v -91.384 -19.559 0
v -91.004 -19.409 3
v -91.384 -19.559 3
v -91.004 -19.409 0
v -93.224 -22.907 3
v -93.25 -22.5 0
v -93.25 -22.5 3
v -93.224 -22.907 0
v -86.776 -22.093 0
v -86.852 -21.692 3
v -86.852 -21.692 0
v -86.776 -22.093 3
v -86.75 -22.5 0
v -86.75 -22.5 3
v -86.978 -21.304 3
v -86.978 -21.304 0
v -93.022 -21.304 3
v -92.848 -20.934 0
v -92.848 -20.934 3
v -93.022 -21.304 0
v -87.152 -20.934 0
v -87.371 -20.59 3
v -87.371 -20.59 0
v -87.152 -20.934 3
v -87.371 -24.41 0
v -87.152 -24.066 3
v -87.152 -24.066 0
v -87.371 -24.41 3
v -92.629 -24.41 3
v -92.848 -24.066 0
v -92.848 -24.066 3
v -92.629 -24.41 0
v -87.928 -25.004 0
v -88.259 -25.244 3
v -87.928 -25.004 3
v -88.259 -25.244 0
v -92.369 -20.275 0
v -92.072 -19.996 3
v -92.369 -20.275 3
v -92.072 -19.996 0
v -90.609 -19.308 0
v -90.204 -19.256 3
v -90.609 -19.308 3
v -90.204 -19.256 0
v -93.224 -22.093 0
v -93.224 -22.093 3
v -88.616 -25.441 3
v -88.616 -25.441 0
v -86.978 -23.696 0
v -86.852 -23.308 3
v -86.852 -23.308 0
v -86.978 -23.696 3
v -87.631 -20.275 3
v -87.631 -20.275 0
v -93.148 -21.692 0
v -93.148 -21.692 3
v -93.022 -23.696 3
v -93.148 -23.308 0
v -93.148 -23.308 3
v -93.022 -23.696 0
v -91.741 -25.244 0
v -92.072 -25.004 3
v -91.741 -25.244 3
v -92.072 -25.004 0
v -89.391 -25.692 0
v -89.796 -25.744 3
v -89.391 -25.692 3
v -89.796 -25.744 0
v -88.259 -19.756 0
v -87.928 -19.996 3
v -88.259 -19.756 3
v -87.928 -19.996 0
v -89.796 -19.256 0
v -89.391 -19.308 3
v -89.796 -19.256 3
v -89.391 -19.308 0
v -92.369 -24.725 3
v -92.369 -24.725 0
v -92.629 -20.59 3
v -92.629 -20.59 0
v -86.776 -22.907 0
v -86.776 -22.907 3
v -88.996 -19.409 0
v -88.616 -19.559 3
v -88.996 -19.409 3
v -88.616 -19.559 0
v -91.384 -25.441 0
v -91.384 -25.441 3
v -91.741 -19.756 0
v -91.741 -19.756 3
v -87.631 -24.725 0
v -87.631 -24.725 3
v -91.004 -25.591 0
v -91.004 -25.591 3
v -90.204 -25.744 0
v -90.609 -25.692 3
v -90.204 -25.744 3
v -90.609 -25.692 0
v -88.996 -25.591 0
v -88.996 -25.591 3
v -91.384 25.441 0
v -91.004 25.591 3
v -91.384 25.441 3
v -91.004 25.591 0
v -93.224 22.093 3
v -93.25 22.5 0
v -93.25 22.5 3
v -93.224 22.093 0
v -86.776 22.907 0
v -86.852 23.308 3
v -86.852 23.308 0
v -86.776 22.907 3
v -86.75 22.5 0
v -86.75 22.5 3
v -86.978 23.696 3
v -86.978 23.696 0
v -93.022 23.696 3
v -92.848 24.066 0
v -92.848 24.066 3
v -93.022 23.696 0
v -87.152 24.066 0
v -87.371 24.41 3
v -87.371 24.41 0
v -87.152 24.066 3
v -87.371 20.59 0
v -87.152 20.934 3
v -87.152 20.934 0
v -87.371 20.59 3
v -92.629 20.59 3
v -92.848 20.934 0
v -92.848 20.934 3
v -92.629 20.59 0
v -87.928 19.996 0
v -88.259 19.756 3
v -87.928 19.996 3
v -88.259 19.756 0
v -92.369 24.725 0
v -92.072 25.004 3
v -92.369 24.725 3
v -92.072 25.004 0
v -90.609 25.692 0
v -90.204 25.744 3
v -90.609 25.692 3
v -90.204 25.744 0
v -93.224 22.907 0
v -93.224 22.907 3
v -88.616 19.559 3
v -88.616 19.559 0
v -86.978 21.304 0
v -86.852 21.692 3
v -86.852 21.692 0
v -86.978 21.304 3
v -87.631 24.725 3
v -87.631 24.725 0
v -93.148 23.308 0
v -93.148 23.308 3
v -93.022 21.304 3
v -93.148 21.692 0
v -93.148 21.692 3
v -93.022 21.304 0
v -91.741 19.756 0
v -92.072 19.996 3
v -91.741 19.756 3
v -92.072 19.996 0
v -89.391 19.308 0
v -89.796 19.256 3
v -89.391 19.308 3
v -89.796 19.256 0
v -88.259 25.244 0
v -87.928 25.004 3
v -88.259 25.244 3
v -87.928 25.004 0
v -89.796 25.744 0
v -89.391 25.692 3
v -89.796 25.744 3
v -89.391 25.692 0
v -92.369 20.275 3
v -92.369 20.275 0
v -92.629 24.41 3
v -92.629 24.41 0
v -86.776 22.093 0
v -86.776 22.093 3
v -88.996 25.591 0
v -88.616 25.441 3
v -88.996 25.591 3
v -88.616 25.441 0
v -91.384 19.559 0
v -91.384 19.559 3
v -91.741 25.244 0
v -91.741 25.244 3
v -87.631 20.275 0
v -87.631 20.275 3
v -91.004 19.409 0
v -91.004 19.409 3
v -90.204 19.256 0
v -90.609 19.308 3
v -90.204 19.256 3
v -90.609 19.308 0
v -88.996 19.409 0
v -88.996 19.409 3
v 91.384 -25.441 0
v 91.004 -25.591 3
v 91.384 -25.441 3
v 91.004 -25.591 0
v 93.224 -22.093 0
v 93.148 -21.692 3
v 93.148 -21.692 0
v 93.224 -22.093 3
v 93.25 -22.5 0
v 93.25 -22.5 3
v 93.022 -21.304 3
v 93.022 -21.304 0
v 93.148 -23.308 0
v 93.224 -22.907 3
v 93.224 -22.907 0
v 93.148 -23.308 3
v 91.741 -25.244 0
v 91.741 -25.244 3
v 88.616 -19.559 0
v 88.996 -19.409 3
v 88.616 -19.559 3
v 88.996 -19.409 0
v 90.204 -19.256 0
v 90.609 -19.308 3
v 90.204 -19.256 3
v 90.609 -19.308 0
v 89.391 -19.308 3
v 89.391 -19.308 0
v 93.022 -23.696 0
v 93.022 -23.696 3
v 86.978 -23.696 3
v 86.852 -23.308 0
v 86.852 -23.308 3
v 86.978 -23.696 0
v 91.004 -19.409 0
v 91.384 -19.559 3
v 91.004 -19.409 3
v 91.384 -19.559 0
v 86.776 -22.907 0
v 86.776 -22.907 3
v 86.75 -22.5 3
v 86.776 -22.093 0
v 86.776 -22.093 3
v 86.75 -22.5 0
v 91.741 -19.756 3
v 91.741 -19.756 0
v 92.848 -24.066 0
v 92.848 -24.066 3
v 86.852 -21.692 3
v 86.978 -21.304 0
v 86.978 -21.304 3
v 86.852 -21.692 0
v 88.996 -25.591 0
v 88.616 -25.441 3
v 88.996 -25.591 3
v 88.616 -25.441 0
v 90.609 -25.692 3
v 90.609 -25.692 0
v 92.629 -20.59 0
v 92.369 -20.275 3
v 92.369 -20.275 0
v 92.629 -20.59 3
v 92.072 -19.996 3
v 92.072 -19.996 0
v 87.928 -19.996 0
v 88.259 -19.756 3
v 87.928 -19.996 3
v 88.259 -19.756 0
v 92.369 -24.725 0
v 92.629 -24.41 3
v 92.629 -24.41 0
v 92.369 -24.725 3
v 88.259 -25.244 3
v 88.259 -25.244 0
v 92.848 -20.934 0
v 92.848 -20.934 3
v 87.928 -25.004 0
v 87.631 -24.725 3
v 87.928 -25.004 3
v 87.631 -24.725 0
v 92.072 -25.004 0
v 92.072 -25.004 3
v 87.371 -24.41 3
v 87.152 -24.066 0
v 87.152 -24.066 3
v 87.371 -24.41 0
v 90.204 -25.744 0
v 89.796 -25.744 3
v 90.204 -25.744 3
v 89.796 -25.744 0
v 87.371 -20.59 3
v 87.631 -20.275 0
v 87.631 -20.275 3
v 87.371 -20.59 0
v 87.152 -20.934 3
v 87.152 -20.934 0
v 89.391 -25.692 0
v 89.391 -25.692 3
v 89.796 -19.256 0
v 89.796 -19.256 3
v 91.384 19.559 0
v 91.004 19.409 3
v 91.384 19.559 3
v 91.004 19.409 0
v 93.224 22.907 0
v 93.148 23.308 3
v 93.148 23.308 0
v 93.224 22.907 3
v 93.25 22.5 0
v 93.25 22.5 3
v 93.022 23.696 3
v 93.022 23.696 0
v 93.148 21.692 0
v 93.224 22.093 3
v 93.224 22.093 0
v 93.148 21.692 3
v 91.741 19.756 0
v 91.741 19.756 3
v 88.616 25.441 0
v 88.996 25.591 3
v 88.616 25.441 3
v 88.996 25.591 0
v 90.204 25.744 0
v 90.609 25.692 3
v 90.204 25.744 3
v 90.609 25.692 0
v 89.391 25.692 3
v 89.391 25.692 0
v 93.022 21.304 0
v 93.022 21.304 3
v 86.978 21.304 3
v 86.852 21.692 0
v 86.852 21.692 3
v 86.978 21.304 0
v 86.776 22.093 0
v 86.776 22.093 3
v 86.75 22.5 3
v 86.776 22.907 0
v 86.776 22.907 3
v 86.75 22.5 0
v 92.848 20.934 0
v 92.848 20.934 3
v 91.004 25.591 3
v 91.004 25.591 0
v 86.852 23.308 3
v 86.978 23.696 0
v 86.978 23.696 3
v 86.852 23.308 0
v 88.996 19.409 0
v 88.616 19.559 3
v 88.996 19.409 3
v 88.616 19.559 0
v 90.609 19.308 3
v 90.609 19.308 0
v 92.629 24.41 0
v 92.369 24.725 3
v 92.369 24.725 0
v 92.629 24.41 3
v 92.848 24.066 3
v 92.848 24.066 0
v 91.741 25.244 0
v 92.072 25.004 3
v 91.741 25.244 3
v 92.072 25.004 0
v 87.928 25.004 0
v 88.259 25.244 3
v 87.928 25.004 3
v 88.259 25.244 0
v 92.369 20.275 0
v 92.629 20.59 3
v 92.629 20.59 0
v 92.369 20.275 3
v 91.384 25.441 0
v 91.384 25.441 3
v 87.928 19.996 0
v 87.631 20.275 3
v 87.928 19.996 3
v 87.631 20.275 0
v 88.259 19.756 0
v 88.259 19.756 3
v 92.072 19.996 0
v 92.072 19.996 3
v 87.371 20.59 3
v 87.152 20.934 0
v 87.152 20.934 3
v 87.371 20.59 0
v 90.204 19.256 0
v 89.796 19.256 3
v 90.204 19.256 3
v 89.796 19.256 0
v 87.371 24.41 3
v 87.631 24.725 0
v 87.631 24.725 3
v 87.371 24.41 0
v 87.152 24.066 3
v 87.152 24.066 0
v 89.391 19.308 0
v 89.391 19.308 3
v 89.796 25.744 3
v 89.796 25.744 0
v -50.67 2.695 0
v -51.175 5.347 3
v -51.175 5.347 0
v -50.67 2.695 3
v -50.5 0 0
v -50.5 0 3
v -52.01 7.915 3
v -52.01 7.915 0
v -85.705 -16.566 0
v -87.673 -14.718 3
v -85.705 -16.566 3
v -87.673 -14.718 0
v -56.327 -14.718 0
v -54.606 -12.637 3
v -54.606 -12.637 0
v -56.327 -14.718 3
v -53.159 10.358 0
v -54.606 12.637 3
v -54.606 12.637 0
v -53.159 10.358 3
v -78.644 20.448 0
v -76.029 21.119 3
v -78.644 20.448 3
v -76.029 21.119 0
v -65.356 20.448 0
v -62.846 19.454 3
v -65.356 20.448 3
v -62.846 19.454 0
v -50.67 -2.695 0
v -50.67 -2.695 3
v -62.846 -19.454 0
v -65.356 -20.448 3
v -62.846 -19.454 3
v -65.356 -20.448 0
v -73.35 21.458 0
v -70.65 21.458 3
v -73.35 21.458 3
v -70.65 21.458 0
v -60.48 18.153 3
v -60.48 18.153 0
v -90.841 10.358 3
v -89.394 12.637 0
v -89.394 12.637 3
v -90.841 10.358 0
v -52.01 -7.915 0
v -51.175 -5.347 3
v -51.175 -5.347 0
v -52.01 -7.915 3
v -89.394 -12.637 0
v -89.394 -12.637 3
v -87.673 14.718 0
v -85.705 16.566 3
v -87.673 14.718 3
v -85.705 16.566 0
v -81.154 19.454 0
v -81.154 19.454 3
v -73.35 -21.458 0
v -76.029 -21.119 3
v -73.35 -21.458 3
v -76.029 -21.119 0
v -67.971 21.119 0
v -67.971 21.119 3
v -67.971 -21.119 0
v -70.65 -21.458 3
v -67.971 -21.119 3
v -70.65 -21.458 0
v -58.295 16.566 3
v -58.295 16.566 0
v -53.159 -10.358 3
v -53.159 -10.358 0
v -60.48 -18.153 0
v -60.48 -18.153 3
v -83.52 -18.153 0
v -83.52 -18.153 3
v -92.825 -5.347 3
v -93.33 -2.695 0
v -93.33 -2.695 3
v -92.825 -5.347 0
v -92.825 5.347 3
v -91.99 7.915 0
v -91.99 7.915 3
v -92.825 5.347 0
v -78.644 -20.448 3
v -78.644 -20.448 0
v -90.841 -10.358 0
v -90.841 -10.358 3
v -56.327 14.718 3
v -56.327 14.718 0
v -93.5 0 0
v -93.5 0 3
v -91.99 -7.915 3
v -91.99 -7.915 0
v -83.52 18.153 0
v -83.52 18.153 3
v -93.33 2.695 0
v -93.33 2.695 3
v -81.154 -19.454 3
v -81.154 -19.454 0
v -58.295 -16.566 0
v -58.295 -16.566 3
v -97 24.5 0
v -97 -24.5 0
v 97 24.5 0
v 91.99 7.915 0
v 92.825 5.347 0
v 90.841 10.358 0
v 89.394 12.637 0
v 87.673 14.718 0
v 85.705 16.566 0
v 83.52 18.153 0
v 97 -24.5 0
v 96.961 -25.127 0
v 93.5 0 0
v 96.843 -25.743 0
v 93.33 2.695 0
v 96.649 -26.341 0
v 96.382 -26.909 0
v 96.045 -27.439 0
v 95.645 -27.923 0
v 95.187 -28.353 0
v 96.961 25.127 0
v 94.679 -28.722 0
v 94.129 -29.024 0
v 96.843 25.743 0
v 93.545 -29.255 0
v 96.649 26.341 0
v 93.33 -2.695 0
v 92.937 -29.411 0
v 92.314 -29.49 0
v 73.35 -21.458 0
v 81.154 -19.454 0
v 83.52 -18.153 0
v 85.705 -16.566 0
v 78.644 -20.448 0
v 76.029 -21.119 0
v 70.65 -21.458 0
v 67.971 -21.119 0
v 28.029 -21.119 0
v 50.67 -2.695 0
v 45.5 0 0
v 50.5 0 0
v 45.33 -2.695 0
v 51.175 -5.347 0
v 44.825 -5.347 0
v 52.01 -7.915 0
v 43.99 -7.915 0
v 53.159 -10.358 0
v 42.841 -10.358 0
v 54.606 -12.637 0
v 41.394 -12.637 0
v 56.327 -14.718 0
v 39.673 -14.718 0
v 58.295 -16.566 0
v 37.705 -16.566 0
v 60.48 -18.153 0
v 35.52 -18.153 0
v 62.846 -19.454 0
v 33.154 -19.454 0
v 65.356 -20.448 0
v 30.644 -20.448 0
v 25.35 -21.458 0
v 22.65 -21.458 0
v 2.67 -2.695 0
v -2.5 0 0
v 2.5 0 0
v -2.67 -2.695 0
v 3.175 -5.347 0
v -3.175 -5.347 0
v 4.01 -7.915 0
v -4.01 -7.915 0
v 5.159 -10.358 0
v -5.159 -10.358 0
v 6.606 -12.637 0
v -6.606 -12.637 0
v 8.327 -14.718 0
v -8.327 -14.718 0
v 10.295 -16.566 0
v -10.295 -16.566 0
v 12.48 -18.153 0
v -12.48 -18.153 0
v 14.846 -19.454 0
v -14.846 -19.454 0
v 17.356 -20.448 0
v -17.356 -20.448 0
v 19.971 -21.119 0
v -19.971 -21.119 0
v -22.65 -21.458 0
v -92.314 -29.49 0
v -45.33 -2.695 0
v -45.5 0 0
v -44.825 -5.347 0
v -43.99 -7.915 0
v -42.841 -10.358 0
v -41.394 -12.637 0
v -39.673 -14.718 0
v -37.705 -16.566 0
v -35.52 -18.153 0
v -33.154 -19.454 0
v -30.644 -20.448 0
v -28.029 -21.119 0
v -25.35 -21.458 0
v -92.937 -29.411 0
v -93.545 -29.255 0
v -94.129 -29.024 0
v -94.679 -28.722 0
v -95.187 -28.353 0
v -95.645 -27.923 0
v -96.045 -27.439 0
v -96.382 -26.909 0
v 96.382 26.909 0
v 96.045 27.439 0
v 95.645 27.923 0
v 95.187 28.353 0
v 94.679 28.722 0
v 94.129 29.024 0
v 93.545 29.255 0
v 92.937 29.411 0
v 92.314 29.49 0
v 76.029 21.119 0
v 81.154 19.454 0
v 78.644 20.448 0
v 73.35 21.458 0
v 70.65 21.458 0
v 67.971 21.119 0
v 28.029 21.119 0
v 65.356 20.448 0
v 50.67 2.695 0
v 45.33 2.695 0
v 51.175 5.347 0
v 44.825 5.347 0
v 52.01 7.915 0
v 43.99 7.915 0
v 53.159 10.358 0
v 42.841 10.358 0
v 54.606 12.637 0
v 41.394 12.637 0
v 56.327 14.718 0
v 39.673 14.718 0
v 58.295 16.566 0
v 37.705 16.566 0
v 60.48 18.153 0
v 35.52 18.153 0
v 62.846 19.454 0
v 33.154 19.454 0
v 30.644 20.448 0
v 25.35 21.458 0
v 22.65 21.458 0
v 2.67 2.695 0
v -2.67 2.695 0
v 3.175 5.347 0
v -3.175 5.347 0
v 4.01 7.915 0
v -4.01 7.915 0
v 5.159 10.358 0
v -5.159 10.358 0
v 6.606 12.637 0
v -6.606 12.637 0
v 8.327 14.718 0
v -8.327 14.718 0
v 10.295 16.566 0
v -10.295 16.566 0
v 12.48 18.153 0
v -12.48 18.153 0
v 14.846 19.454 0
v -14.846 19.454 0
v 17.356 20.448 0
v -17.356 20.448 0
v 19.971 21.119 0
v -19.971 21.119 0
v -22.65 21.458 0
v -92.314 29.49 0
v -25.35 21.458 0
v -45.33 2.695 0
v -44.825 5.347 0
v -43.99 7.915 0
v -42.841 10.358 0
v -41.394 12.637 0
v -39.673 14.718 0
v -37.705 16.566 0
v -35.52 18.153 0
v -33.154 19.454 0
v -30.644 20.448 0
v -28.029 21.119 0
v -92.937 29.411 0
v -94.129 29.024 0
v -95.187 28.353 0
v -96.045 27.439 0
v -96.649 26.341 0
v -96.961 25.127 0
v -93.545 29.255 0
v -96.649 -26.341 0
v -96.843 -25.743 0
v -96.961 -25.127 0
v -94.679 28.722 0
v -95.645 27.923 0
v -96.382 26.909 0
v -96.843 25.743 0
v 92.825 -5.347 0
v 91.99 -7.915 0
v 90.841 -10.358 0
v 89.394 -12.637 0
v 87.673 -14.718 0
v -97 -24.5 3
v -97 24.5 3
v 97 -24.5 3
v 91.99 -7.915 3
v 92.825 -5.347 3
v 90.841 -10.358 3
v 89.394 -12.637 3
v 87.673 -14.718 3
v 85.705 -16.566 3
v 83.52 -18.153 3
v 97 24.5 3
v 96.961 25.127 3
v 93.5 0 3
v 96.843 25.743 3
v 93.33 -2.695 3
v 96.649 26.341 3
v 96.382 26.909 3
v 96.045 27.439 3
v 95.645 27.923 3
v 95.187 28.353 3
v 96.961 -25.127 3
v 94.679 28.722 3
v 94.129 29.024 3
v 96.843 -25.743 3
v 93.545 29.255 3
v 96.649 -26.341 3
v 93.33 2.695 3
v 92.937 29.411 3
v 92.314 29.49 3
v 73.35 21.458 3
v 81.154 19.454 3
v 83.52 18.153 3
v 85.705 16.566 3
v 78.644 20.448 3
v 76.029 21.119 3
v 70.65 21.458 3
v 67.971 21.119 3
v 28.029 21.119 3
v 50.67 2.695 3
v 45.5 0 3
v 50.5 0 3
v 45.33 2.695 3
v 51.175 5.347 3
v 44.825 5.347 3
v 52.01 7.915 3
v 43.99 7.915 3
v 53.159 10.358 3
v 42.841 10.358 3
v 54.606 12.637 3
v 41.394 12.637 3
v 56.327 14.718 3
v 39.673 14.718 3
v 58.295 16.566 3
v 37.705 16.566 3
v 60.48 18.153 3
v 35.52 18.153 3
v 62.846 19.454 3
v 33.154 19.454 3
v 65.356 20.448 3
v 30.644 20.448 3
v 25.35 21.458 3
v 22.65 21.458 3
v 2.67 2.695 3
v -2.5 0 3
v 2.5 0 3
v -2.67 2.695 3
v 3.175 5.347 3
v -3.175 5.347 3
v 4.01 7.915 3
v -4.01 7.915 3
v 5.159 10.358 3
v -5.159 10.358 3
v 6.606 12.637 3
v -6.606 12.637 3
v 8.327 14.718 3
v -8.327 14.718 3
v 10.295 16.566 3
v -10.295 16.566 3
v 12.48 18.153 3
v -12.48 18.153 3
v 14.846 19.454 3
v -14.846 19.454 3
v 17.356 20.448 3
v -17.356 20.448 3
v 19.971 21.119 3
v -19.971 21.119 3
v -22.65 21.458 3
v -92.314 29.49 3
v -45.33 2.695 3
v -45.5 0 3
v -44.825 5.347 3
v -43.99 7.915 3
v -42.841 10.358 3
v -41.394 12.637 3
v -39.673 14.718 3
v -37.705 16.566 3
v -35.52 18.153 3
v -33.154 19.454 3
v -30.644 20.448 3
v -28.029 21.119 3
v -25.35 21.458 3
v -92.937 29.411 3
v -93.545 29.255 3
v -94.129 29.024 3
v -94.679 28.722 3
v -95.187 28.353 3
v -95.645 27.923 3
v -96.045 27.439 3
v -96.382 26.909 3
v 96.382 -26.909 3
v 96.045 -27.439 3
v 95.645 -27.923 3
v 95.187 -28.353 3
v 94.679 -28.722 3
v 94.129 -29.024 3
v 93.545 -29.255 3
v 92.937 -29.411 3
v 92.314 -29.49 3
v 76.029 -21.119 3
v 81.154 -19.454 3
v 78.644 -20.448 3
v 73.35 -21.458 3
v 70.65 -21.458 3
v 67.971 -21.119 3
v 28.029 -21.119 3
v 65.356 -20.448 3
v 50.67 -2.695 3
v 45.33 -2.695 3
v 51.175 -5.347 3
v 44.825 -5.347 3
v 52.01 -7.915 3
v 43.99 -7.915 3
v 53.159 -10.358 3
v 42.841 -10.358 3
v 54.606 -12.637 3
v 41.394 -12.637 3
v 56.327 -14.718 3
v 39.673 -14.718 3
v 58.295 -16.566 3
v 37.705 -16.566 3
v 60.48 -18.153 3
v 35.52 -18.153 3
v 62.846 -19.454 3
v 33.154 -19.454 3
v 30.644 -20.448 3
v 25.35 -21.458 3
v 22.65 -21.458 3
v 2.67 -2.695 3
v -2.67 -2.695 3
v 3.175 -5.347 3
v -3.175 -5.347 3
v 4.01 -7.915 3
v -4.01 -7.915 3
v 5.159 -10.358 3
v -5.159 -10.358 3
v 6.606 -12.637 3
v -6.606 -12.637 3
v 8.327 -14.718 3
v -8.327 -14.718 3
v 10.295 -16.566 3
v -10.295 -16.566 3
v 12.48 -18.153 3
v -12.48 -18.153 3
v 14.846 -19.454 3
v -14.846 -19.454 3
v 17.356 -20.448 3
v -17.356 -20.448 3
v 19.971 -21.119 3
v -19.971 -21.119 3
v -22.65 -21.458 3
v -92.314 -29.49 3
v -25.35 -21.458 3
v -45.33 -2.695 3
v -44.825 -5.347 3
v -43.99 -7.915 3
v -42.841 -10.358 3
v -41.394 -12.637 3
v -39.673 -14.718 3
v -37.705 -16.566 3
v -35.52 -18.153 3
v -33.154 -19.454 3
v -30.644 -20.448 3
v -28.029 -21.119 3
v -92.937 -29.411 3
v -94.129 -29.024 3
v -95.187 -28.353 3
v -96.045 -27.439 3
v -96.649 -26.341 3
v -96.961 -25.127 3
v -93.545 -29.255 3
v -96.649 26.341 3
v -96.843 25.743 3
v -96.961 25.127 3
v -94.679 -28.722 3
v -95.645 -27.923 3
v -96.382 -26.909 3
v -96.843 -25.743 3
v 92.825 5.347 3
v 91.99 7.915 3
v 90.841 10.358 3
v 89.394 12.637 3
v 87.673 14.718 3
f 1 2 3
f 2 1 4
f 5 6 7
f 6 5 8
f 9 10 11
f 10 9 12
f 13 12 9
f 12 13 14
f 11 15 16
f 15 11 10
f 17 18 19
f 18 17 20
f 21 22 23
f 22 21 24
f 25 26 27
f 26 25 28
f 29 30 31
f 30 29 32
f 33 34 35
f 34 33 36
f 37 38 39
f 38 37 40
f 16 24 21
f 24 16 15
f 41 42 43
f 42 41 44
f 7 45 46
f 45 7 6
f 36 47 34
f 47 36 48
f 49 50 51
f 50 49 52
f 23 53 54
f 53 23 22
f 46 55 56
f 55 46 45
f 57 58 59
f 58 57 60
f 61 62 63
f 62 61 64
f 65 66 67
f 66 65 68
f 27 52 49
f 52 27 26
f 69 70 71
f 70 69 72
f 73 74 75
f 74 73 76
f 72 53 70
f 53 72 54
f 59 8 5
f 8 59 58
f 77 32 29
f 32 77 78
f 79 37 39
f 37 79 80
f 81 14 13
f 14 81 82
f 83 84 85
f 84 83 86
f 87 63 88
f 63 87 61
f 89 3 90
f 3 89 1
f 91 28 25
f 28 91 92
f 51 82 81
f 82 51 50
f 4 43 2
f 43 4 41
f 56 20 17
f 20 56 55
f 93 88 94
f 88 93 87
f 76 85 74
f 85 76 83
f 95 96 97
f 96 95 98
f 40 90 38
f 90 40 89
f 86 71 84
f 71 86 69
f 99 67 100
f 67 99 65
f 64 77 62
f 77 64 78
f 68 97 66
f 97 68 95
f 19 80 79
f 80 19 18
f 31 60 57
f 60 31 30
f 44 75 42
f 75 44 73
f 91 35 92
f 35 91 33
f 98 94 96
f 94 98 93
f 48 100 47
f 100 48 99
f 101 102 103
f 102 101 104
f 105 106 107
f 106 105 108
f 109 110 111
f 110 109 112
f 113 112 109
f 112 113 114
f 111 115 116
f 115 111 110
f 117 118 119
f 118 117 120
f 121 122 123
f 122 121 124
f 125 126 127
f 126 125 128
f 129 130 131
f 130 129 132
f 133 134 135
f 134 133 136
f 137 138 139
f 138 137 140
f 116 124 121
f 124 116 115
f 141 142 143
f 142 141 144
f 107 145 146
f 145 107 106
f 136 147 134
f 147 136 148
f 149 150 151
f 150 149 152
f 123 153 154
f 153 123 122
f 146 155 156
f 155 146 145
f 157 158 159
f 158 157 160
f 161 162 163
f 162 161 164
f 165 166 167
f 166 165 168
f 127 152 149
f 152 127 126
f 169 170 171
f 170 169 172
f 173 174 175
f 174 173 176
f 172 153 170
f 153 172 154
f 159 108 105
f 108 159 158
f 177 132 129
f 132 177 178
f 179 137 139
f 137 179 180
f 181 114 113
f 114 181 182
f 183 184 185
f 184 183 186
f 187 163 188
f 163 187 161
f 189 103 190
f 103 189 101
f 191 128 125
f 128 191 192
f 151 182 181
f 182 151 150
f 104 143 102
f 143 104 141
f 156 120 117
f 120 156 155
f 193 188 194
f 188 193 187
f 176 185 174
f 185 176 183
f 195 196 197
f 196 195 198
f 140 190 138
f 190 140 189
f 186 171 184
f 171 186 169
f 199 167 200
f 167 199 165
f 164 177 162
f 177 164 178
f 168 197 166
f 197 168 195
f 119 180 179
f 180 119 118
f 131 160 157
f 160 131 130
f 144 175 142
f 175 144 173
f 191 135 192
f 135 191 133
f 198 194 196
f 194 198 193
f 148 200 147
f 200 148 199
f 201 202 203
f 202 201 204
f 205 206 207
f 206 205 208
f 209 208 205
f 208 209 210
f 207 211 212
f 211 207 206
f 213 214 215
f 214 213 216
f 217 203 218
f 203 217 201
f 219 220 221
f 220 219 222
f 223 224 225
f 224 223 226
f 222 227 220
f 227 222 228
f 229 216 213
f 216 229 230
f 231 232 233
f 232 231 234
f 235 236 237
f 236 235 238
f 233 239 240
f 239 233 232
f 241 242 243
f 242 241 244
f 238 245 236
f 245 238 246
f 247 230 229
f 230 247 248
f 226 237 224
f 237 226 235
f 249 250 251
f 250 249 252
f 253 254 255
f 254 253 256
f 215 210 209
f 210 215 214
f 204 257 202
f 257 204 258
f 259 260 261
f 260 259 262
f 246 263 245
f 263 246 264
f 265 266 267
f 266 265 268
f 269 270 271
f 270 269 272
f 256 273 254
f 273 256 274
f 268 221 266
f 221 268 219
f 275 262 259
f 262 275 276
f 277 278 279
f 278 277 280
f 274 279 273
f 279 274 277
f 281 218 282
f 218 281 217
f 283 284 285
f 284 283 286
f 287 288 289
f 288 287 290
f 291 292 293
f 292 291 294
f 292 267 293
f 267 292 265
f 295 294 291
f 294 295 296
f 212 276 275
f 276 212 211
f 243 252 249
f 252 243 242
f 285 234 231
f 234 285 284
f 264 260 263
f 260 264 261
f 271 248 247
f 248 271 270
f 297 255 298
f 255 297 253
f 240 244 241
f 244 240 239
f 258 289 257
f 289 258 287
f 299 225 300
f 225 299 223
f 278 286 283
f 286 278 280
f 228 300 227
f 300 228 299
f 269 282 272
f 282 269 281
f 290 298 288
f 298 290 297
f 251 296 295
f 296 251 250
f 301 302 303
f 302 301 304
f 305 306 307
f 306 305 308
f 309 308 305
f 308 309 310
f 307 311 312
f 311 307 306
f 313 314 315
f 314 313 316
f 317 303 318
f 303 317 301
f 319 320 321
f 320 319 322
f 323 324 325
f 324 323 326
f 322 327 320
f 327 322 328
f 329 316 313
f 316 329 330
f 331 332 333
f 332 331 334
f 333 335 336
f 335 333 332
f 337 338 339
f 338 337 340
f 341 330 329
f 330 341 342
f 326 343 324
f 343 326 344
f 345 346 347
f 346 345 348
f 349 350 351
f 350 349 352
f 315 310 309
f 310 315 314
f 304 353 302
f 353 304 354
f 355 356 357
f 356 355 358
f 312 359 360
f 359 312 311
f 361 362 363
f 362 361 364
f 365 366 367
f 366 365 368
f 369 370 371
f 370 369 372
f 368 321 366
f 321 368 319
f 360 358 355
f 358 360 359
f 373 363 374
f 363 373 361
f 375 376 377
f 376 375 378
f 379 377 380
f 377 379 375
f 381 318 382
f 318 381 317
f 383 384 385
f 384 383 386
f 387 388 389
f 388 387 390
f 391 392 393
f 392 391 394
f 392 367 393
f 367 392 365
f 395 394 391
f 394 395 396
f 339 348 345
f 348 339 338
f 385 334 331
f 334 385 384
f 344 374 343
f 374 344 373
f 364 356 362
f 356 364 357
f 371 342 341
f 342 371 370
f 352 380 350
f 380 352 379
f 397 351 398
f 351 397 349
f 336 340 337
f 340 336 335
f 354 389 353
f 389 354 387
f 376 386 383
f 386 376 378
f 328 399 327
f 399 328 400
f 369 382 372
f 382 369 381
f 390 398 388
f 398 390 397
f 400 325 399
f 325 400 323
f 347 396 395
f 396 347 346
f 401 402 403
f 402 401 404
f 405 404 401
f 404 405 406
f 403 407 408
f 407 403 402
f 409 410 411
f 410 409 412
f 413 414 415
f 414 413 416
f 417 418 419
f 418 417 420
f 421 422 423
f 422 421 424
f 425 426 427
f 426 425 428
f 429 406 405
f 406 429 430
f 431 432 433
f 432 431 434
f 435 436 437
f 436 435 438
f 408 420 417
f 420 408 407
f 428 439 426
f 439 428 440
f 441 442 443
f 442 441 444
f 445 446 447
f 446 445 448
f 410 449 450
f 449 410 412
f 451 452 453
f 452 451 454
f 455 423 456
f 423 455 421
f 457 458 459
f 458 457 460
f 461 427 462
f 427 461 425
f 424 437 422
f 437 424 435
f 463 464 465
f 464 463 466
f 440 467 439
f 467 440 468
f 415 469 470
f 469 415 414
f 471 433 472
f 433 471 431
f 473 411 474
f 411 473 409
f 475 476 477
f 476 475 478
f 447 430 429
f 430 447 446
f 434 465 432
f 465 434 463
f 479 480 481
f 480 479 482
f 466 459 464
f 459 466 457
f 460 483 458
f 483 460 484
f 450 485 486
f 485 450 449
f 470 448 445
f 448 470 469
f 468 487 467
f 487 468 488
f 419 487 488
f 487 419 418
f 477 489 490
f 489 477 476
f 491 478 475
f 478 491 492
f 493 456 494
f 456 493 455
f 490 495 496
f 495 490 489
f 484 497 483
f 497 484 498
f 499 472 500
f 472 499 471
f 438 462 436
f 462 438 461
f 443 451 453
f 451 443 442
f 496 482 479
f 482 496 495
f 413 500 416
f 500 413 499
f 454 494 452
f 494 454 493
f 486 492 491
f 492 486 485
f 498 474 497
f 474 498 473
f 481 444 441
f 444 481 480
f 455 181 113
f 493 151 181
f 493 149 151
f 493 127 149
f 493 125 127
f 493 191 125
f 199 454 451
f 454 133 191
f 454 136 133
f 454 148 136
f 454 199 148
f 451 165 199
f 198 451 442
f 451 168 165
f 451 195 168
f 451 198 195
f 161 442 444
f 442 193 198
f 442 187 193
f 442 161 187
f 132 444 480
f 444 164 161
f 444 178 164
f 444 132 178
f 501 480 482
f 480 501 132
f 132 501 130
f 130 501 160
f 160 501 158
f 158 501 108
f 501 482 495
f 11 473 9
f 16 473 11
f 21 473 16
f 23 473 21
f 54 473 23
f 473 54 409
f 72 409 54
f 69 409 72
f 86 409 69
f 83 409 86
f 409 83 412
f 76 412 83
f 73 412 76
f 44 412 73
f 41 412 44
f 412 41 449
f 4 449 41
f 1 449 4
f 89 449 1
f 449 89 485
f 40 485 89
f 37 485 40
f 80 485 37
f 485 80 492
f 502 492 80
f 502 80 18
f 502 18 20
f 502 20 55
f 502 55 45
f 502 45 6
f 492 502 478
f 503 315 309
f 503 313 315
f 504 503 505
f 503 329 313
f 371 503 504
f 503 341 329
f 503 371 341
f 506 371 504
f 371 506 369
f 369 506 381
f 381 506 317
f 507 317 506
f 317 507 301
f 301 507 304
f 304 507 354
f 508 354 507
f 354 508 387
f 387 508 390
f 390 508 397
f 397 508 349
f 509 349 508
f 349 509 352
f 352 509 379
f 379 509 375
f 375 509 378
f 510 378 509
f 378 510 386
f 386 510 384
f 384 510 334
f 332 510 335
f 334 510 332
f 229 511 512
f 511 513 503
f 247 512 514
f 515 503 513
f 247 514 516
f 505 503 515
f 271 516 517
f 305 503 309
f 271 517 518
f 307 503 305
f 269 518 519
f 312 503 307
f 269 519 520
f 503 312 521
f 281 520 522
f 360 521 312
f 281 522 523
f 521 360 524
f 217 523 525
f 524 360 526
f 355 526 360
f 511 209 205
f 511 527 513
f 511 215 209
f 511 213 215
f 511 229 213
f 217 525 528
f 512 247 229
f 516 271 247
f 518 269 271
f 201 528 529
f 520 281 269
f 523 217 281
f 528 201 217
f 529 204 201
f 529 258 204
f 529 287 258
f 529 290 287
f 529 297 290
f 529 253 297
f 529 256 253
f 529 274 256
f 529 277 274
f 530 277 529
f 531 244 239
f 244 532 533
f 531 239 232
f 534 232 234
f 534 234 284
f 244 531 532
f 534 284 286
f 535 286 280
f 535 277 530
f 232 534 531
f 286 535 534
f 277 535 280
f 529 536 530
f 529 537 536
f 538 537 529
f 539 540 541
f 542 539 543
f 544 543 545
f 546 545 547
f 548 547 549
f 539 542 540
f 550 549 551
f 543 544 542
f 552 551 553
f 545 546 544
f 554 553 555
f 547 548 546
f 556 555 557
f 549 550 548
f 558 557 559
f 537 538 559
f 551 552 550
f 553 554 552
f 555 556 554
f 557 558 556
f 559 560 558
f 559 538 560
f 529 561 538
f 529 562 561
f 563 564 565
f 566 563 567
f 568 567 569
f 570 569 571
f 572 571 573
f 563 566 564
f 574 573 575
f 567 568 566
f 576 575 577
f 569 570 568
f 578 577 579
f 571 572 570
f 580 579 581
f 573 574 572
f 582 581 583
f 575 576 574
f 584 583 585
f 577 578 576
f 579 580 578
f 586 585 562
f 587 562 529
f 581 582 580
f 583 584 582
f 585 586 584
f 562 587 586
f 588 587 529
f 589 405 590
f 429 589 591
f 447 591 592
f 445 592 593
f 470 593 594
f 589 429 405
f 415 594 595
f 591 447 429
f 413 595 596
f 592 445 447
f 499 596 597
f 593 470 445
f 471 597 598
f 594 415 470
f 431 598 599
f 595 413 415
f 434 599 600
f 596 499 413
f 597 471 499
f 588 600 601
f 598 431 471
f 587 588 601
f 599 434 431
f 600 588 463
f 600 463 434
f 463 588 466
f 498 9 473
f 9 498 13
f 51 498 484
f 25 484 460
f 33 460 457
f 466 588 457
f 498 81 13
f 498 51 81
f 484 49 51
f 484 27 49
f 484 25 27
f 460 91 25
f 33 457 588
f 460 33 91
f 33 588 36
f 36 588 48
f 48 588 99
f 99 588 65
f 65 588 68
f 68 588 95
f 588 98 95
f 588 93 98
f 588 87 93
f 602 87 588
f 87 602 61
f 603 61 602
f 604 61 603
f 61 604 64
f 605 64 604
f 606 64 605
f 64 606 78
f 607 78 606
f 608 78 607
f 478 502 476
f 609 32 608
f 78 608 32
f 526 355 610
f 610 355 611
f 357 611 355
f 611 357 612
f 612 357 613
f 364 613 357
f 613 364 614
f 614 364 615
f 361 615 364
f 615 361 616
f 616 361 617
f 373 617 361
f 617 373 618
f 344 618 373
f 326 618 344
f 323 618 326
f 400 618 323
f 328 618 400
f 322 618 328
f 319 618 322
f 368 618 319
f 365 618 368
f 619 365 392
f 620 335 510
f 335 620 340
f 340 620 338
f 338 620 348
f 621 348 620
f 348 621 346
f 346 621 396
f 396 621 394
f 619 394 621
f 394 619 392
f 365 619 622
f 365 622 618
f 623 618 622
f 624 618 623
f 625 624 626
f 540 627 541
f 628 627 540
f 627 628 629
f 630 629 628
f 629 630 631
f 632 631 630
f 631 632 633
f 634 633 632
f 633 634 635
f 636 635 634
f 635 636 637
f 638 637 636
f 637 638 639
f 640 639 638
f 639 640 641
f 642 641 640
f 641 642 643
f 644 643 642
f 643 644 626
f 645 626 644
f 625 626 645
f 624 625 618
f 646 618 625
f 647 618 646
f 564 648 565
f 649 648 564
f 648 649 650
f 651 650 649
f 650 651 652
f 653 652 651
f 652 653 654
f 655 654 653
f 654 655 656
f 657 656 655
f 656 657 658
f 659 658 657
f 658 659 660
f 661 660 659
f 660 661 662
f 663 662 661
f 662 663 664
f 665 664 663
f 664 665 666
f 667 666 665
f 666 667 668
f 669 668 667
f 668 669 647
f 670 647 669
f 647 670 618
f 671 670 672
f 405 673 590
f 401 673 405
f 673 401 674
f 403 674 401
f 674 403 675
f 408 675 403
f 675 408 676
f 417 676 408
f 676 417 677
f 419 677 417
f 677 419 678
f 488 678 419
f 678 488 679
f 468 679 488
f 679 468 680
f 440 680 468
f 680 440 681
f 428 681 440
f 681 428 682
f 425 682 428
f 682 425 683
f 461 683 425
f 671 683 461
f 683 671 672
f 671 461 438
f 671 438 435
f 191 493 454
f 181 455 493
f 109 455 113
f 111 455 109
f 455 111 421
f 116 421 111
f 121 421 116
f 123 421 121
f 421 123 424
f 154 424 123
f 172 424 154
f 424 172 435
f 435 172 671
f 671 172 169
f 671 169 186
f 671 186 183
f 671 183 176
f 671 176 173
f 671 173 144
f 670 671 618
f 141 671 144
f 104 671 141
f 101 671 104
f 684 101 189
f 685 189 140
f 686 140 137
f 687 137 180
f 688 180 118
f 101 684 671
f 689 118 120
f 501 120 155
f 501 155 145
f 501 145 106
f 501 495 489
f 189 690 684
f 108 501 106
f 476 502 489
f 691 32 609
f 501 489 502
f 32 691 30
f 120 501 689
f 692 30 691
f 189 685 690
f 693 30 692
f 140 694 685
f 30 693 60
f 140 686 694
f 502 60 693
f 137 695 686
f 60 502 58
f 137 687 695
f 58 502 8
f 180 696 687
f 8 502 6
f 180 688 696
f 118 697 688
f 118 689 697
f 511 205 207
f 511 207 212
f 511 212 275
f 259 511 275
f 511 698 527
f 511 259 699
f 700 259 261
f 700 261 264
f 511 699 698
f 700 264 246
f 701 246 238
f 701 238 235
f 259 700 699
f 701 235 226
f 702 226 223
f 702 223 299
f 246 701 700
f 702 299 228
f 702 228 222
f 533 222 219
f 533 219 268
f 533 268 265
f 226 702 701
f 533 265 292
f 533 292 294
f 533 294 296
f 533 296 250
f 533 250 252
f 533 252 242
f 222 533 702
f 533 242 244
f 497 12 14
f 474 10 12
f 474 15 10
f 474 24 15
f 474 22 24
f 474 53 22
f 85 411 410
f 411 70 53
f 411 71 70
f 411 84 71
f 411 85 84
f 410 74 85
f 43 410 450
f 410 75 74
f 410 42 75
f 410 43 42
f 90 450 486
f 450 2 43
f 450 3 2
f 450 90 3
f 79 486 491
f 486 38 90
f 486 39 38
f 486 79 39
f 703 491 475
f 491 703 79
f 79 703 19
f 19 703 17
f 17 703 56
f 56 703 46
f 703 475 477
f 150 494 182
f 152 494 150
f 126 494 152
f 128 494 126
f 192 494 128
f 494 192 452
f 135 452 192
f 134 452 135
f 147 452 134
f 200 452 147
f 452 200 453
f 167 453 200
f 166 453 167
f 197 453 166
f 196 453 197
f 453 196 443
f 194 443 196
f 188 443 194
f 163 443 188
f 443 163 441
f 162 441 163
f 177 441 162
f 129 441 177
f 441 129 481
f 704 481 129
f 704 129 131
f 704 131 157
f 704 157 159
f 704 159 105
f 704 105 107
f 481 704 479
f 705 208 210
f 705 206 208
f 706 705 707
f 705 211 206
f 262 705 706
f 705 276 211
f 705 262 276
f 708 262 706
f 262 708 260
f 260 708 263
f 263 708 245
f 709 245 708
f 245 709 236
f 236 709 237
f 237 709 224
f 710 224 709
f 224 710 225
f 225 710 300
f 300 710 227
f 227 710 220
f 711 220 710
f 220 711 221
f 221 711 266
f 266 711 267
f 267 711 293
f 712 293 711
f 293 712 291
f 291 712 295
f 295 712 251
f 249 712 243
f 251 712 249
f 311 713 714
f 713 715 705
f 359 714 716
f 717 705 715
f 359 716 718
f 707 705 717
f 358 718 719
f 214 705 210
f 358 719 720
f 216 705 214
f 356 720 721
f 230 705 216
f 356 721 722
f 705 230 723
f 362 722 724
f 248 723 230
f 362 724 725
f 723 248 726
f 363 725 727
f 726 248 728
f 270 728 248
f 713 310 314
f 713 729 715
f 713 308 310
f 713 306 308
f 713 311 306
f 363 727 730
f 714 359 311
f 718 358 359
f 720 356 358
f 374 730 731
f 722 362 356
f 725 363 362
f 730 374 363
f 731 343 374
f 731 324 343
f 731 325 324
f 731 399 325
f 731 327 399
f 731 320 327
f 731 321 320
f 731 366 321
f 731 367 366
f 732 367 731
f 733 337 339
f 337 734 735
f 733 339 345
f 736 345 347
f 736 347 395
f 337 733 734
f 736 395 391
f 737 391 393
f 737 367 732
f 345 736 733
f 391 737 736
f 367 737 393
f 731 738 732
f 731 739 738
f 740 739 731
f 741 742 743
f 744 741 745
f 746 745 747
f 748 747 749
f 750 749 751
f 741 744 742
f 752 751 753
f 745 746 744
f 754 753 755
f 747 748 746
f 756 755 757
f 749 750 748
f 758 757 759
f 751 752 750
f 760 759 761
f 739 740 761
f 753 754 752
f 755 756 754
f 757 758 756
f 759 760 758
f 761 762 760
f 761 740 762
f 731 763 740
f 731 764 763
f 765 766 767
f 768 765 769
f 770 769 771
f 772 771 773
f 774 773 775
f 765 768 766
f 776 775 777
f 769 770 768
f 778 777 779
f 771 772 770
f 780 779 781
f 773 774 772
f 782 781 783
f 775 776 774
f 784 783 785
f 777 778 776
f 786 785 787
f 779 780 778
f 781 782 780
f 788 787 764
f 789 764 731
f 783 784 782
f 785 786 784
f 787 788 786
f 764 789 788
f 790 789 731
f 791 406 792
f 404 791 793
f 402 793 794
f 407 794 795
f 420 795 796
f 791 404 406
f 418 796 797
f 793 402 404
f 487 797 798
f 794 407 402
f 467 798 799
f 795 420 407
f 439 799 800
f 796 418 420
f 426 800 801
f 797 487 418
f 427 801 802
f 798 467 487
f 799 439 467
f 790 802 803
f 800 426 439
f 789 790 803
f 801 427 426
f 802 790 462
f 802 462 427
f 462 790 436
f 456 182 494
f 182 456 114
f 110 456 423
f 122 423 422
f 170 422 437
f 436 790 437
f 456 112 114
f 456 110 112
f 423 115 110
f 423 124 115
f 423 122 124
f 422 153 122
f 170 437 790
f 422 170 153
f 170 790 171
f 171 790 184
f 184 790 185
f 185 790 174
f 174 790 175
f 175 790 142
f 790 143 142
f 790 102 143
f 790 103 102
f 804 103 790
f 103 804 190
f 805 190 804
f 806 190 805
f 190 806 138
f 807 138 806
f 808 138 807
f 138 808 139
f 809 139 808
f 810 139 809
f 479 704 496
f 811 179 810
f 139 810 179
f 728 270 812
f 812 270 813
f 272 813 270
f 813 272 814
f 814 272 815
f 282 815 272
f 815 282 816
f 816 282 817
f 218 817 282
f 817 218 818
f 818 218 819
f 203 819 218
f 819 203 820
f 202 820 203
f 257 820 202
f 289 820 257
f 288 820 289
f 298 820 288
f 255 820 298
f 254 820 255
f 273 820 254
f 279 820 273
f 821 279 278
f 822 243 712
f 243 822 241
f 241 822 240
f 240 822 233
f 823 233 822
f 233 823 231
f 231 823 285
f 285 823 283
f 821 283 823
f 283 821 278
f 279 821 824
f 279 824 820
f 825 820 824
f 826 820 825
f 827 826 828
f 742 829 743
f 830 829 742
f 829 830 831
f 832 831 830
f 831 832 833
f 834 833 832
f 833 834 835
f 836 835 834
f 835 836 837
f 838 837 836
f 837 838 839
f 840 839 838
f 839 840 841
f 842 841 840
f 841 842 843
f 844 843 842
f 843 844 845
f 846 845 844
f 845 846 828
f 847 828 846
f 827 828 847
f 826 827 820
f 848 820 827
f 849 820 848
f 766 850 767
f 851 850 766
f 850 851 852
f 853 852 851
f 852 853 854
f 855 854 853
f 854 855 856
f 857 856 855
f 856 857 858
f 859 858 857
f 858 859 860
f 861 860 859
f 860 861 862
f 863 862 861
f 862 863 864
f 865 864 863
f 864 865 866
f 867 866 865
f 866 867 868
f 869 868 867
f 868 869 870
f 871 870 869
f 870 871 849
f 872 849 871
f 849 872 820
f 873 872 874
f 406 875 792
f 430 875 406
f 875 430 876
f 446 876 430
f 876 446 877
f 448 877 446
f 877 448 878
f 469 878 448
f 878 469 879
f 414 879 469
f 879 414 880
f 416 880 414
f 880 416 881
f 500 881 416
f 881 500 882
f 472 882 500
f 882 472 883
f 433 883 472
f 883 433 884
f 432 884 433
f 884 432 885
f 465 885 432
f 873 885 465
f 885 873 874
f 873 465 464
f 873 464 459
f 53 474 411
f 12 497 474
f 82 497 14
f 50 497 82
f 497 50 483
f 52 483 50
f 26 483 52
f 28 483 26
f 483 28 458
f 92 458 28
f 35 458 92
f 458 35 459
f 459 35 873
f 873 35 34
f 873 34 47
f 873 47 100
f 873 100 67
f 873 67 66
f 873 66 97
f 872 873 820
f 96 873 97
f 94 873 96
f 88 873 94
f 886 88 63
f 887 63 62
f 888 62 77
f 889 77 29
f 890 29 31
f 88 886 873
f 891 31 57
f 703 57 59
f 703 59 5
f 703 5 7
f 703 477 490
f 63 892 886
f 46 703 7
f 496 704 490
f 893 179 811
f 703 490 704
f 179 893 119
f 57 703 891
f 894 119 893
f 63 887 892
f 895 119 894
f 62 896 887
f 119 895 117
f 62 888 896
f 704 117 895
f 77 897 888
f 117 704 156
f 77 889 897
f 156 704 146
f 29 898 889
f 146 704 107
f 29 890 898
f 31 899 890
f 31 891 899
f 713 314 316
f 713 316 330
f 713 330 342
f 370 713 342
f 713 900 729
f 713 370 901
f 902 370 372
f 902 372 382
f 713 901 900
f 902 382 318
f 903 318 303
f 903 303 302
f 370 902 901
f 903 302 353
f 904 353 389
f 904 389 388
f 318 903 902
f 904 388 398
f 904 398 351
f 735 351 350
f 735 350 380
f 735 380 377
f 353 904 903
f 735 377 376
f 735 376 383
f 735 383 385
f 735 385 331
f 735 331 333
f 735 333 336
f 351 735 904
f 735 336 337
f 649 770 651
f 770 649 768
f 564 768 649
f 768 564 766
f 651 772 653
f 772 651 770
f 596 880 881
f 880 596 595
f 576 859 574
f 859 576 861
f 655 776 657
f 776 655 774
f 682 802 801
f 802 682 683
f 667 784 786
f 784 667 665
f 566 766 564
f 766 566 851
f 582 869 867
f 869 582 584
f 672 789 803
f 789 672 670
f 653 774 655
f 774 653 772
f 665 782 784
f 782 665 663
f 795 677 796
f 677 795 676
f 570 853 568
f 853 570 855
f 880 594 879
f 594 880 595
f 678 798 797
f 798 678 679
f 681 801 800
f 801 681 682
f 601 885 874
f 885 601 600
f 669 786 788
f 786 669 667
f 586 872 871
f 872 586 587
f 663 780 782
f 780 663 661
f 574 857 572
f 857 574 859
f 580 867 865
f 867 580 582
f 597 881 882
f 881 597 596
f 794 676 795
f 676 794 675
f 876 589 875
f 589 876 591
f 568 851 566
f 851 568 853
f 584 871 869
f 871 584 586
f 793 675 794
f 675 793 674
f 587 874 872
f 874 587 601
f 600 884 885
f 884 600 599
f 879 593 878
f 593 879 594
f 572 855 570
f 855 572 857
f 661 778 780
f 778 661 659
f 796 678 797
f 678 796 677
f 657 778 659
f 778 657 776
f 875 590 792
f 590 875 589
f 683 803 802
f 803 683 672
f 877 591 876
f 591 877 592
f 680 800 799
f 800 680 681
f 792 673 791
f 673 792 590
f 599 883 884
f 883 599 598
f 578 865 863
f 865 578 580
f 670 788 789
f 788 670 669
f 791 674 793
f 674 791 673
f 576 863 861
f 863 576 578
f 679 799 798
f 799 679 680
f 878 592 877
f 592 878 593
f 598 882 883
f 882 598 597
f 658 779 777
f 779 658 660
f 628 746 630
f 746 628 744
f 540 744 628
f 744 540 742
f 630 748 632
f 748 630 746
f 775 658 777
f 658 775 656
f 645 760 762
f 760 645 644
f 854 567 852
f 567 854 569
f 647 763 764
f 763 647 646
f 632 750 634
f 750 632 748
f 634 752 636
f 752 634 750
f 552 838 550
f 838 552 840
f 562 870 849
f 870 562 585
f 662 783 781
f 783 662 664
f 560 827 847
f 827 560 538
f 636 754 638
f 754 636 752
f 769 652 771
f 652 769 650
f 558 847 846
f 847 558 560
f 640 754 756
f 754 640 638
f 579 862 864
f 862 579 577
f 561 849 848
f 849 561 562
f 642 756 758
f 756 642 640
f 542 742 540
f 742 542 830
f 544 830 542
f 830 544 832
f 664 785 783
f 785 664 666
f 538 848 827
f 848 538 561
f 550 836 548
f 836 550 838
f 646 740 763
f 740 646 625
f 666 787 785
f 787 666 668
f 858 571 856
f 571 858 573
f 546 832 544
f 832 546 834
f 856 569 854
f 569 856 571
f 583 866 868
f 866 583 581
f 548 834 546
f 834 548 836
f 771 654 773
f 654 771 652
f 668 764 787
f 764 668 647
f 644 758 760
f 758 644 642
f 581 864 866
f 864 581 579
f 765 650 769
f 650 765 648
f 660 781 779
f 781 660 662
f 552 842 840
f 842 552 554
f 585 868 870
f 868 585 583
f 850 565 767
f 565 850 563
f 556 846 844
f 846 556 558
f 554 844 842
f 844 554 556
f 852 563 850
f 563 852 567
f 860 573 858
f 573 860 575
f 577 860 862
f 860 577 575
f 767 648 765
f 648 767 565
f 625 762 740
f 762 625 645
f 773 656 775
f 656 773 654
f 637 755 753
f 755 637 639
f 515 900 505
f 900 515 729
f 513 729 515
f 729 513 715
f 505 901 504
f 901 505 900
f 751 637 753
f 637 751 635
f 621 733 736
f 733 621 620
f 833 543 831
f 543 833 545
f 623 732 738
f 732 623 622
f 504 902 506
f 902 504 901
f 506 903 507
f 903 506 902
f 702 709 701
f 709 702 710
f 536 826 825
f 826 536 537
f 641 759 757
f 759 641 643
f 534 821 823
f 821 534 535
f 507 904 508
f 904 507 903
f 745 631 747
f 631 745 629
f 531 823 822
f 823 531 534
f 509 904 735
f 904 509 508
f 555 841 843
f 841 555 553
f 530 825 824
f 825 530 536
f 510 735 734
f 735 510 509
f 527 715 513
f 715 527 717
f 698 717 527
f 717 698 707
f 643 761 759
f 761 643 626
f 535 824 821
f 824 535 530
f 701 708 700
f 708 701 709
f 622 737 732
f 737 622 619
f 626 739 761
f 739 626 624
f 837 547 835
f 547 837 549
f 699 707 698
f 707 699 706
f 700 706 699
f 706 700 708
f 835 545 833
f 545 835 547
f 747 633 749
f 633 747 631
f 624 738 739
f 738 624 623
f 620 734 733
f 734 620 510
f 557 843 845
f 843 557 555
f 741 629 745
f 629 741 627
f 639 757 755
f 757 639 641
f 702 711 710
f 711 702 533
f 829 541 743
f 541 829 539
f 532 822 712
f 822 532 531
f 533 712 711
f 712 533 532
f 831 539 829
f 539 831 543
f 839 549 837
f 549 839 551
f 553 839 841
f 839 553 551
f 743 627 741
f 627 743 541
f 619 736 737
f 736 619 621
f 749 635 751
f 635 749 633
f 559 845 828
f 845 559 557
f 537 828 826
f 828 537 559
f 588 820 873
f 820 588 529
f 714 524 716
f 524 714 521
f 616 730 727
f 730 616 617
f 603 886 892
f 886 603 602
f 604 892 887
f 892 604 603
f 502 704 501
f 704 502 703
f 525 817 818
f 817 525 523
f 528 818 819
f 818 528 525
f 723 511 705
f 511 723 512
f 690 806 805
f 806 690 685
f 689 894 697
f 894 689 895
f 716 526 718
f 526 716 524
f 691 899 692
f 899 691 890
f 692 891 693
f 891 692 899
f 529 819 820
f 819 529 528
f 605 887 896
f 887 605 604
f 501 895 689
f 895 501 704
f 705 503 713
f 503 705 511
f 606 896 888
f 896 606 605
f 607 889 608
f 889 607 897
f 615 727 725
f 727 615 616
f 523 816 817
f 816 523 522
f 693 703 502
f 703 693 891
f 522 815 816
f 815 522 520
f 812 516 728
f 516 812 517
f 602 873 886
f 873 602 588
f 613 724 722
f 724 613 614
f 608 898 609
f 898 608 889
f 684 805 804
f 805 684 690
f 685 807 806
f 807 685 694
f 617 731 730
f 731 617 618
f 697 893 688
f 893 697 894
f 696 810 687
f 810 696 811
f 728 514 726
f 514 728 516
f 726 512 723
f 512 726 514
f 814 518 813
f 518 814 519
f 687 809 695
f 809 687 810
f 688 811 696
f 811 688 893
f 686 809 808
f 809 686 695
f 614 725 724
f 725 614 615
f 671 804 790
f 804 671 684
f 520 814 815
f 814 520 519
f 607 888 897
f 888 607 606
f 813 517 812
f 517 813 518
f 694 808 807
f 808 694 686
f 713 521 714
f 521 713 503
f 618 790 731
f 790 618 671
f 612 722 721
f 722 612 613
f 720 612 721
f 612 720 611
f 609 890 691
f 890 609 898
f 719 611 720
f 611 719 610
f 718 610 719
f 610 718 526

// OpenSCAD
$fn = 50;

difference() {
	union() {
		hull() {
			translate(v = [-92.0, 24.5, 0]) {
				cylinder(h = 3, r = 5);
			}
			translate(v = [92.0, 24.5, 0]) {
				cylinder(h = 3, r = 5);
			}
			translate(v = [-92.0, -24.5, 0]) {
				cylinder(h = 3, r = 5);
			}
			translate(v = [92.0, -24.5, 0]) {
				cylinder(h = 3, r = 5);
			}
		}
	}
	union() {
		translate(v = [-90.0, -22.5, -100.0]) {
			cylinder(h = 200, r = 3.25);
		}
		translate(v = [-90.0, 22.5, -100.0]) {
			cylinder(h = 200, r = 3.25);
		}
		translate(v = [90.0, -22.5, -100.0]) {
			cylinder(h = 200, r = 3.25);
		}
		translate(v = [90.0, 22.5, -100.0]) {
			cylinder(h = 200, r = 3.25);
		}
		translate(v = [-90.0, -22.5, -100.0]) {
			cylinder(h = 200, r = 1.8);
		}
		translate(v = [-90.0, 22.5, -100.0]) {
			cylinder(h = 200, r = 1.8);
		}
		translate(v = [90.0, -22.5, -100.0]) {
			cylinder(h = 200, r = 1.8);
		}
		translate(v = [90.0, 22.5, -100.0]) {
			cylinder(h = 200, r = 1.8);
		}
		translate(v = [-72.0, 0, 0.0]) {
			cylinder(h = 3, r = 21.5);
		}
		translate(v = [-24.0, 0, 0.0]) {
			cylinder(h = 3, r = 21.5);
		}
		translate(v = [24.0, 0, 0.0]) {
			cylinder(h = 3, r = 21.5);
		}
		translate(v = [72.0, 0, 0.0]) {
			cylinder(h = 3, r = 21.5);
		}
	}
}
